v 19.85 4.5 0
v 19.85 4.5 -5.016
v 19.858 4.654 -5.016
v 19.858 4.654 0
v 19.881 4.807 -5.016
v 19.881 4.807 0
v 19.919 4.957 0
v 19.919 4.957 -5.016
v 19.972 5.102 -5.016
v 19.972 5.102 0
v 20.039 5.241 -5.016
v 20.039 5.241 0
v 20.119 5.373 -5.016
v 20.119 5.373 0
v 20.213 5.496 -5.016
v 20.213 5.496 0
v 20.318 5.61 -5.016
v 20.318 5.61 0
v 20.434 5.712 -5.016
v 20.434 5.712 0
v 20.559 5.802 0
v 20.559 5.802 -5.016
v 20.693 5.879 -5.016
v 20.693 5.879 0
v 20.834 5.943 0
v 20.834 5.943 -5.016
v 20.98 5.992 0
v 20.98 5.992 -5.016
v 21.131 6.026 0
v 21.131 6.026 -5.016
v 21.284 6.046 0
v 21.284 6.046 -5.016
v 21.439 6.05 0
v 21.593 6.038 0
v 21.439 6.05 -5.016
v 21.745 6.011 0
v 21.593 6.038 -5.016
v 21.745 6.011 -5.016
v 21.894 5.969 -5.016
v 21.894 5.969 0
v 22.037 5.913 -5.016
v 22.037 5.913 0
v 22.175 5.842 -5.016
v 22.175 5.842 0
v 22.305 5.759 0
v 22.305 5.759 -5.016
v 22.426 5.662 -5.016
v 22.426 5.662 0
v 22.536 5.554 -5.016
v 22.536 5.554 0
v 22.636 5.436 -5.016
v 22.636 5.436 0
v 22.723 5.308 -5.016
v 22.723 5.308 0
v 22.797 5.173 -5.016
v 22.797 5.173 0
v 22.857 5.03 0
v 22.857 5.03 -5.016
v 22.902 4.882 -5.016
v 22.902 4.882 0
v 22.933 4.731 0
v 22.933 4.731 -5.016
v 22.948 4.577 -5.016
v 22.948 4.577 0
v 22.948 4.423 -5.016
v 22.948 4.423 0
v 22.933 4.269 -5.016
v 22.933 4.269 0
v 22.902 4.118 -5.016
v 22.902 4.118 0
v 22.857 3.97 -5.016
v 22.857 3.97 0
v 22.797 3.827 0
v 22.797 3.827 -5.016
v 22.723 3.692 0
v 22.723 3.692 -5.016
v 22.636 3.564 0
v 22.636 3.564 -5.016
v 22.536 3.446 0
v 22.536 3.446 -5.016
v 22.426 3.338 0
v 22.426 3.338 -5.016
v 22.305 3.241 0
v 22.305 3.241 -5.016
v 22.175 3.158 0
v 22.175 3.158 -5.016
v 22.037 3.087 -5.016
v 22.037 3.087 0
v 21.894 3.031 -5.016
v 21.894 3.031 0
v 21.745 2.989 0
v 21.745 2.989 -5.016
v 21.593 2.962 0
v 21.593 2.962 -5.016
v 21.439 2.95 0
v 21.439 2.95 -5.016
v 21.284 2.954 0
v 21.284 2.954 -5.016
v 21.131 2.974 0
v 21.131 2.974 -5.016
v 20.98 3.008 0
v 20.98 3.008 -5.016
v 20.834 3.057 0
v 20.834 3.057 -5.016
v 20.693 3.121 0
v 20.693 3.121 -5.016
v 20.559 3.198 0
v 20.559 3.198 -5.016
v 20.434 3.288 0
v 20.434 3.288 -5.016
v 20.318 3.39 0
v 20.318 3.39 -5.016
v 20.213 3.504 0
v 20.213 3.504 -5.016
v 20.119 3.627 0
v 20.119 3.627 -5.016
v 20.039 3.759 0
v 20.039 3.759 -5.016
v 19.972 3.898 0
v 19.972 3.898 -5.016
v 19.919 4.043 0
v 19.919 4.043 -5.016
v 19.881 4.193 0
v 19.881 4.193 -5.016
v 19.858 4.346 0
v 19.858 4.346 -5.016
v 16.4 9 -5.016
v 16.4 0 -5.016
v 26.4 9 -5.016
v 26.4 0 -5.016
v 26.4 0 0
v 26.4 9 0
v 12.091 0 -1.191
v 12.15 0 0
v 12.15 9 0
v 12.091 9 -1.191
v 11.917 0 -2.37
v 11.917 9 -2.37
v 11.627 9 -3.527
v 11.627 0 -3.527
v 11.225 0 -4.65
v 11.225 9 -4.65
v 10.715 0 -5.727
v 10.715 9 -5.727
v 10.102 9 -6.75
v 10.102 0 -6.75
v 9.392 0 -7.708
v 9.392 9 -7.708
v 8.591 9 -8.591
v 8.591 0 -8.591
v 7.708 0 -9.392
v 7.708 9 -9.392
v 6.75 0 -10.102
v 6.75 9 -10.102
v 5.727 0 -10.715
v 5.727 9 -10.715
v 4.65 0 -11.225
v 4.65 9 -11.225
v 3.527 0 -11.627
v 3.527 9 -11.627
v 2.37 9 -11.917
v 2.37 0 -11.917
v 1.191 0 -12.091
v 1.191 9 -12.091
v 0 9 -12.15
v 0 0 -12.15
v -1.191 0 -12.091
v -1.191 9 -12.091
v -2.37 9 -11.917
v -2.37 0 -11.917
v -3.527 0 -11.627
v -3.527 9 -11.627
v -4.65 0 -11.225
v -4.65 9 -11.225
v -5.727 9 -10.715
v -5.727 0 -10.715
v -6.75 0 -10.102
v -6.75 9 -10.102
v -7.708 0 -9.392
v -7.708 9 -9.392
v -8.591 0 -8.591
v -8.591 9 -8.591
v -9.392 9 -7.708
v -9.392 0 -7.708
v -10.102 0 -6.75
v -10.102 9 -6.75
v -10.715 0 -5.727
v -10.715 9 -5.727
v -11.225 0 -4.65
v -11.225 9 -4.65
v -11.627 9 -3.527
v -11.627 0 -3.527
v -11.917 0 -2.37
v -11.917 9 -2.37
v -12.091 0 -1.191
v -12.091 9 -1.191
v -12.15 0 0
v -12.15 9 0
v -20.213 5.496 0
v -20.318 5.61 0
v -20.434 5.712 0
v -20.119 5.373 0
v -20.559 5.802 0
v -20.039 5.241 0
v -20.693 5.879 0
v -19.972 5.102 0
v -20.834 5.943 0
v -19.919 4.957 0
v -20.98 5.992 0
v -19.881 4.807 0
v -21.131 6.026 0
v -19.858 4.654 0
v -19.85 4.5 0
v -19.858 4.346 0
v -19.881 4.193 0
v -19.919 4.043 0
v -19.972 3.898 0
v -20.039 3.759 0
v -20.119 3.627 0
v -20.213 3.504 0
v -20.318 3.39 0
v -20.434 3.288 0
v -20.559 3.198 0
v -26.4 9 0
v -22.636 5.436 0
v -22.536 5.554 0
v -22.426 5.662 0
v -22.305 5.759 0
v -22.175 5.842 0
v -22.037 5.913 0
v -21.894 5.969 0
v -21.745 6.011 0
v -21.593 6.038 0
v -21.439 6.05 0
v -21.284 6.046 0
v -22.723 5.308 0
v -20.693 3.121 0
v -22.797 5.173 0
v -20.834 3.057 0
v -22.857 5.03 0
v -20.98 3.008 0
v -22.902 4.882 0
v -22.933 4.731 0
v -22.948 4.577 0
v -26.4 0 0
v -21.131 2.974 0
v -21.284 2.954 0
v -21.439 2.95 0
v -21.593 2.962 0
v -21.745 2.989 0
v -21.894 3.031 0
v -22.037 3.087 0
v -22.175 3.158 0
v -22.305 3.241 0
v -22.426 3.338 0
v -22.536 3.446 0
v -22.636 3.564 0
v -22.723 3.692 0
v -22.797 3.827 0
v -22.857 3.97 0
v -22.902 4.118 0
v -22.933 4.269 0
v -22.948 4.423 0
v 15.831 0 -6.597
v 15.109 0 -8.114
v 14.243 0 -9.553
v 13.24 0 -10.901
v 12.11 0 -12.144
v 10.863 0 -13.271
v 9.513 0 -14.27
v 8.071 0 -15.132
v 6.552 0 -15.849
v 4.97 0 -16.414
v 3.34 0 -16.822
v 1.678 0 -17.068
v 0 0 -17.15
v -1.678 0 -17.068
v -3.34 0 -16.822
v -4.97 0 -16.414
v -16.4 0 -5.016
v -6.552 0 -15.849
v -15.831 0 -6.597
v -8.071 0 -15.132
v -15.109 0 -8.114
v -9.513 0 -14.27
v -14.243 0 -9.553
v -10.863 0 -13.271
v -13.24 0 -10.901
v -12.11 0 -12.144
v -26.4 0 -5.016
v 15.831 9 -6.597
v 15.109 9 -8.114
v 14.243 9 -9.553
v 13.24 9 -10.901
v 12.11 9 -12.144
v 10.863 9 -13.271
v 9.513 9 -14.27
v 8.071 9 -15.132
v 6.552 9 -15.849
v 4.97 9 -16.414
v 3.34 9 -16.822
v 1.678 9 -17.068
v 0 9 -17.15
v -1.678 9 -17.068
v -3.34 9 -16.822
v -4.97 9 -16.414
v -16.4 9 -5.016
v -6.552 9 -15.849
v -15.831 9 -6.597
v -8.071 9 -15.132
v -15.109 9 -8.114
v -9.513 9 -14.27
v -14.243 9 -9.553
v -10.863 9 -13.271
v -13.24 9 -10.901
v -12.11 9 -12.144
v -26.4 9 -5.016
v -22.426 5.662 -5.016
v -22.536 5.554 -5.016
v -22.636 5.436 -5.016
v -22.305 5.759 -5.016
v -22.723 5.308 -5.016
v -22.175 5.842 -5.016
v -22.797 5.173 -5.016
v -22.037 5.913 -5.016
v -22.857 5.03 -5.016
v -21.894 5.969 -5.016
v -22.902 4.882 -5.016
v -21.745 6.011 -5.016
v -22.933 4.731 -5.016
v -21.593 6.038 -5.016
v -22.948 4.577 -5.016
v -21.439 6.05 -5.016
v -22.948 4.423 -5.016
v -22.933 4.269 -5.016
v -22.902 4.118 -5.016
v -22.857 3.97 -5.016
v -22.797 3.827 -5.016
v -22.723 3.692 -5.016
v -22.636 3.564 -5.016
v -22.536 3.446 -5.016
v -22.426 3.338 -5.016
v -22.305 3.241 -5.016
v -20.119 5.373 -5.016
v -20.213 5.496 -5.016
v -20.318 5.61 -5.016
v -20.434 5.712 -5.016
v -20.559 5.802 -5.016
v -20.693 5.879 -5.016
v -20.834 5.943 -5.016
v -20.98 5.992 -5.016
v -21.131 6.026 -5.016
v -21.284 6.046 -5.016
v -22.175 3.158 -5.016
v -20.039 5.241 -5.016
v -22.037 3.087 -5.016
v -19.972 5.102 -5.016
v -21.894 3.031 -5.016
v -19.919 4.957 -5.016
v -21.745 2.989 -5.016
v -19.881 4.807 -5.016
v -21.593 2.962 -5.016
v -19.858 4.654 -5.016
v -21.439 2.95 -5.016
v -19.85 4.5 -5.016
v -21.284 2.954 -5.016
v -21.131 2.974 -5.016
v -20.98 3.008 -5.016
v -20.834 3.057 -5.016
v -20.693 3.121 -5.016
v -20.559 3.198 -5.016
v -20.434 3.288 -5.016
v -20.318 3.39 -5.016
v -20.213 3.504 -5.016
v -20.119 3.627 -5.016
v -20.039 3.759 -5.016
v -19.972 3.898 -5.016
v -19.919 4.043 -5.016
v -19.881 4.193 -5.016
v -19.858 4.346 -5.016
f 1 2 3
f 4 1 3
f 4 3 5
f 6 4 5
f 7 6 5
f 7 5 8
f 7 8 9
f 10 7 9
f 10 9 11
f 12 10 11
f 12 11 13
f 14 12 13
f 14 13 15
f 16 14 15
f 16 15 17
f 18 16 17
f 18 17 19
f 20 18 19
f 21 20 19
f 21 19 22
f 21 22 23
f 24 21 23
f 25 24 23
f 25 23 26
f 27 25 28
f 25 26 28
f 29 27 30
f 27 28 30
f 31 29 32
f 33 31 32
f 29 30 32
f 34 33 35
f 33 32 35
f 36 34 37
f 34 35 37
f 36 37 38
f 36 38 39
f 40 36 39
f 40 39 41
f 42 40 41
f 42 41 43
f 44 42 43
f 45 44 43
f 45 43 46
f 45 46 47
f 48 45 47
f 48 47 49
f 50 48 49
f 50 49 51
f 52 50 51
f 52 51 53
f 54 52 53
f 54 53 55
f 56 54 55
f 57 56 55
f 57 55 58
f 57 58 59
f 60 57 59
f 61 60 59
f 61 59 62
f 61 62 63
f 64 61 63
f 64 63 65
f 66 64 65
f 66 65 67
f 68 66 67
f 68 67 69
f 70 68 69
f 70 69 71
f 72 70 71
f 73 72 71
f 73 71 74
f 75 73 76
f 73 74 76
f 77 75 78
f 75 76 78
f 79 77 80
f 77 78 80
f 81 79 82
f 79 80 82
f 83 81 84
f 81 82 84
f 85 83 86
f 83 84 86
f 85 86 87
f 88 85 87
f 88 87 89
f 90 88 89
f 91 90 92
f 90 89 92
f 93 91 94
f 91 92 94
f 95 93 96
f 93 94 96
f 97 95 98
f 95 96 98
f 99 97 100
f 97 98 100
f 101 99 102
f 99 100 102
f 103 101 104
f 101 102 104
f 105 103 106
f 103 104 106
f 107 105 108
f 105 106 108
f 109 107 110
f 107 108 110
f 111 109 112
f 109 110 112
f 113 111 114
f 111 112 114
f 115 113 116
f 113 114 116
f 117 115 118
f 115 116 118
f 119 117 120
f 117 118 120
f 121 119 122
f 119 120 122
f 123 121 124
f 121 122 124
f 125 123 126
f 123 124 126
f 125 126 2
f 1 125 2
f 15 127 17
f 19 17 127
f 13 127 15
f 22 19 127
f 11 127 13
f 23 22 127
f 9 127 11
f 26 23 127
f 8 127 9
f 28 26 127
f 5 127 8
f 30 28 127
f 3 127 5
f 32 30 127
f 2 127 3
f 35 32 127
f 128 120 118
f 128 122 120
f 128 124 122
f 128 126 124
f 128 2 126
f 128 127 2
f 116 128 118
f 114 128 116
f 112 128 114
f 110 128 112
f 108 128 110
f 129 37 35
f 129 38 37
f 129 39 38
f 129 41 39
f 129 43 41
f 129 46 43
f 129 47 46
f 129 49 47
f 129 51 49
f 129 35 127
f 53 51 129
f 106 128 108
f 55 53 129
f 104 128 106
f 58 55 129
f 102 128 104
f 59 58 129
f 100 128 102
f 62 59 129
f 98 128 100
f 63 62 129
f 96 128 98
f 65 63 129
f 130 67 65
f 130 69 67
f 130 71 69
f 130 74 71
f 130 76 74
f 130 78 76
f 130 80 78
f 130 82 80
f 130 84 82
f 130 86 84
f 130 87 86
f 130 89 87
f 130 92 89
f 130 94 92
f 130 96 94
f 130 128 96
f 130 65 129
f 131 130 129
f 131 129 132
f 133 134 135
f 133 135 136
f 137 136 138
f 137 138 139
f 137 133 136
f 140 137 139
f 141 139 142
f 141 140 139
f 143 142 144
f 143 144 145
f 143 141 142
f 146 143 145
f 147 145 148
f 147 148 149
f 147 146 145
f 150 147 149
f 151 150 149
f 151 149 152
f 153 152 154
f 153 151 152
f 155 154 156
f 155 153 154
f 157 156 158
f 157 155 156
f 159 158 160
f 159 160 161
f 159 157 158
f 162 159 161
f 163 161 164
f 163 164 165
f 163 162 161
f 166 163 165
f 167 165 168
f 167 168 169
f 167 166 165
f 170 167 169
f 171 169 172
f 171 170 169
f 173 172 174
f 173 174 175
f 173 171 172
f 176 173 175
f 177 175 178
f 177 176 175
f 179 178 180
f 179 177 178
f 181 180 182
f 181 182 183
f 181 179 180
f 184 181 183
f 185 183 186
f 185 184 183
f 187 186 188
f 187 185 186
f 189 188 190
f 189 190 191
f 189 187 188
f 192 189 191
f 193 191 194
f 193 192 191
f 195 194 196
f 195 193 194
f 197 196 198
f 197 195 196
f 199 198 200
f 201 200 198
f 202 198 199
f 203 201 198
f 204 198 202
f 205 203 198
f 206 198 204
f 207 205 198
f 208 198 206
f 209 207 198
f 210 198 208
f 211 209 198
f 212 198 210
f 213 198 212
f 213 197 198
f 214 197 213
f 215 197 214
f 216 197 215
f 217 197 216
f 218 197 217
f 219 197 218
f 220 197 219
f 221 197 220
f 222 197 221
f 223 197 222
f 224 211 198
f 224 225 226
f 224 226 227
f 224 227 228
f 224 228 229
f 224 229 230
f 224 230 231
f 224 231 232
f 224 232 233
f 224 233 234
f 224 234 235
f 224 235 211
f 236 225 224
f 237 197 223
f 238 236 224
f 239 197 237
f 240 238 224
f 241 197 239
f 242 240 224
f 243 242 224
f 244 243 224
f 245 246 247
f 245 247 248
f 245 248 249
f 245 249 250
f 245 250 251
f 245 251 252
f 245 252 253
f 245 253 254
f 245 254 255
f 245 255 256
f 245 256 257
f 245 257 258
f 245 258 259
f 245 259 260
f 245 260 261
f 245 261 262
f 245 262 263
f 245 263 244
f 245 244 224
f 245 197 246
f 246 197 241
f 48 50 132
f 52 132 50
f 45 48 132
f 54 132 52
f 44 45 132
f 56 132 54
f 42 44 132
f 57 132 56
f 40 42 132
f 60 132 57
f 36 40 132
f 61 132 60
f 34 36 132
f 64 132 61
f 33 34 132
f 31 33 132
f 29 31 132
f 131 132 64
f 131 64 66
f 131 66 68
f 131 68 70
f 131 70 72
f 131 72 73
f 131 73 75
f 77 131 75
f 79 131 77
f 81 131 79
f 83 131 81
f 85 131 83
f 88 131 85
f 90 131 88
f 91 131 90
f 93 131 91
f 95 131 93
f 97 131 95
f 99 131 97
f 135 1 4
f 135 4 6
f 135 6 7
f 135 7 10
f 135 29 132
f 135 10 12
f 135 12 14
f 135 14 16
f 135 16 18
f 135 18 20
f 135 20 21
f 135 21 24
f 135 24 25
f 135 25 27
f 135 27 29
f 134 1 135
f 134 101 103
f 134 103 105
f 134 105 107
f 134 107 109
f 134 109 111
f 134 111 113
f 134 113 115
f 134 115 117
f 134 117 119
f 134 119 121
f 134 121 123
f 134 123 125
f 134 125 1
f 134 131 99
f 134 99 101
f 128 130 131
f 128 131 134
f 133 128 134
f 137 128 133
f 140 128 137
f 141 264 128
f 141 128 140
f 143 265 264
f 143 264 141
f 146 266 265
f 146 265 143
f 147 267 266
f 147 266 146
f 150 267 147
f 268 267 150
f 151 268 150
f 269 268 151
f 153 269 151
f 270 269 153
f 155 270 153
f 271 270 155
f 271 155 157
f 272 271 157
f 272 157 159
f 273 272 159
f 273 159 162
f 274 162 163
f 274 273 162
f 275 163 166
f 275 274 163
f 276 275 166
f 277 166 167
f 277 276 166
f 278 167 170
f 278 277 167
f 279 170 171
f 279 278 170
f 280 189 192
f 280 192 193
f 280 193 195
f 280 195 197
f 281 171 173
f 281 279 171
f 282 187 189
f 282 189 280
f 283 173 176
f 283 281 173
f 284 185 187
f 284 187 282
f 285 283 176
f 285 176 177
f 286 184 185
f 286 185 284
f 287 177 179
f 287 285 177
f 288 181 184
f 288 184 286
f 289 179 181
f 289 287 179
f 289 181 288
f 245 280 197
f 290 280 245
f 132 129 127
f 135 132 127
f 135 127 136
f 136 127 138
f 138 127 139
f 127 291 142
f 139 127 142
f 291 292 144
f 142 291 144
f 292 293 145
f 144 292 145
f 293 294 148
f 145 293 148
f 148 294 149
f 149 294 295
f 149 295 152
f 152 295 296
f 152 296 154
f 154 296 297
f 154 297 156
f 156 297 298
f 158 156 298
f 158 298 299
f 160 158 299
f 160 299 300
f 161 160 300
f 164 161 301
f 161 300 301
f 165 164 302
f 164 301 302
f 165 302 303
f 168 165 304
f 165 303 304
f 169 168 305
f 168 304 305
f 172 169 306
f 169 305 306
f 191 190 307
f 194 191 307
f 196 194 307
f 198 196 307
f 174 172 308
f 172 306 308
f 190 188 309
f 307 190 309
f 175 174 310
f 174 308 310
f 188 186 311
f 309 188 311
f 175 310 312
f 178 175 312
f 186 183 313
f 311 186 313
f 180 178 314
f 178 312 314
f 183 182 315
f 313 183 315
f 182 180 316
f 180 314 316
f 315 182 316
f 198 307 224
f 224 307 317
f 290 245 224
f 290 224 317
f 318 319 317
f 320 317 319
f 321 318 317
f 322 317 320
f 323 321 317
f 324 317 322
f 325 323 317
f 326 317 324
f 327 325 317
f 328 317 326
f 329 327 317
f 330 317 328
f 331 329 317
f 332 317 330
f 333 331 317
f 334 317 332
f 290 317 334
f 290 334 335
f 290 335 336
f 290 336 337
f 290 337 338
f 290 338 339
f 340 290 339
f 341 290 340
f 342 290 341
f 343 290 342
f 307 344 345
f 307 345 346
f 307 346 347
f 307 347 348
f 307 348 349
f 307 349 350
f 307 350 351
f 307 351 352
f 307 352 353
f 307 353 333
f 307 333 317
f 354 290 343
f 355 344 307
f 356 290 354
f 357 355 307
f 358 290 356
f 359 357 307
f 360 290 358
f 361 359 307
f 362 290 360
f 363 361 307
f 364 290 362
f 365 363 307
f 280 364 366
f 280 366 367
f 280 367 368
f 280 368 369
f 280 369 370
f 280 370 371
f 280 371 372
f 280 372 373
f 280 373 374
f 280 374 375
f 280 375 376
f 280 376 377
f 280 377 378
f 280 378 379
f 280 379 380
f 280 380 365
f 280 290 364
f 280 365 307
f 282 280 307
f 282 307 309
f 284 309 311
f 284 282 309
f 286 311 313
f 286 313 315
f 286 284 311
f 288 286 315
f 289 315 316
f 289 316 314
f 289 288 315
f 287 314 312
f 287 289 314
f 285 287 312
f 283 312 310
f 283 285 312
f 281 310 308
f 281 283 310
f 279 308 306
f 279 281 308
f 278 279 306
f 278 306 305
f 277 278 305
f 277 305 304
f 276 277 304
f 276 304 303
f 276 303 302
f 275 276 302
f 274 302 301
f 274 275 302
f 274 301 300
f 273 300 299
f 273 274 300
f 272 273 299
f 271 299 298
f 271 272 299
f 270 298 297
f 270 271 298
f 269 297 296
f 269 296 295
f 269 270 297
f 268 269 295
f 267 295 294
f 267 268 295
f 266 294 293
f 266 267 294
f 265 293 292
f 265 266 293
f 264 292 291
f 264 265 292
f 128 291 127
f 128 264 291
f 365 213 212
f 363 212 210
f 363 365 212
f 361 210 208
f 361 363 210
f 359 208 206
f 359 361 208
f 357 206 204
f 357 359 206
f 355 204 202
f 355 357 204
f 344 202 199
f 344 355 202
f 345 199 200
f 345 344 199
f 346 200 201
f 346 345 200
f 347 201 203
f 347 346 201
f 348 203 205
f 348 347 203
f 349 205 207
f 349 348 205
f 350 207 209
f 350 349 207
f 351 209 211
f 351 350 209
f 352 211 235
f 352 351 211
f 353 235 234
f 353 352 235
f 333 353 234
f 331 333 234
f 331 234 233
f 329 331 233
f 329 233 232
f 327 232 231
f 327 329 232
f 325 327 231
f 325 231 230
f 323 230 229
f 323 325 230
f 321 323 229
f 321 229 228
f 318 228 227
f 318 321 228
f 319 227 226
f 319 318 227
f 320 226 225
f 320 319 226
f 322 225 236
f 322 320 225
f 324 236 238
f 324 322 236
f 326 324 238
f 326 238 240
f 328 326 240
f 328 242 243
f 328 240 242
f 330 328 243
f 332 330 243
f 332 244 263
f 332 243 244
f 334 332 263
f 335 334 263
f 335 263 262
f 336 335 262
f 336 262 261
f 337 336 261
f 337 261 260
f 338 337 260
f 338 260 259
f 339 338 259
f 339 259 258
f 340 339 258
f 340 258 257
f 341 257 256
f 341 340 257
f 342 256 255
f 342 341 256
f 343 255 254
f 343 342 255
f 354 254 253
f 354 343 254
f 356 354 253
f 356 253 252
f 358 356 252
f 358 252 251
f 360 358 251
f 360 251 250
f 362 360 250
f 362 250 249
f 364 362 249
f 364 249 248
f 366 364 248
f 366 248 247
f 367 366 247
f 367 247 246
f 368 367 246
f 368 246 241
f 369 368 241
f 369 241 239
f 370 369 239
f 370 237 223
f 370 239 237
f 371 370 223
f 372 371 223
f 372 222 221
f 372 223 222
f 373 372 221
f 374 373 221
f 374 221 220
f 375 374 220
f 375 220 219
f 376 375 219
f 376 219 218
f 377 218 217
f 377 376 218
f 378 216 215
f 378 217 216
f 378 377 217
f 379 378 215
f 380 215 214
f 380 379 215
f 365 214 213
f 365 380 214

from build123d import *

# Parameters (mm, degrees)
BOSS_EXTRUDE1_DEPTH = 9
SKETCH2_R           = 1.55
CUT_EXTRUDE1_DEPTH  = 9


with BuildPart() as part:
    # Sketch1 → Boss-Extrude1 (new body)
    with BuildSketch(Plane(origin=(0, 0, 0), x_dir=(1, 0, 0), z_dir=(0, 1, 0))):
        with BuildLine():
            Line((16.4, 5.016223679), (26.4, 5.016223679))
            Line((26.4, 5.016223679), (26.4, 0))
            Line((26.4, 0), (12.15, 0))
            ThreePointArc((12.15, 0), (0, 12.15), (-12.15, 0))
            Line((-12.15, 0), (-26.4, 0))
            Line((-26.4, 0), (-26.4, 5.016223679))
            Line((-26.4, 5.016223679), (-16.4, 5.016223679))
            ThreePointArc((-16.4, 5.016223679), (0, 17.15), (16.4, 5.016223679))
        make_face()
    extrude(amount=BOSS_EXTRUDE1_DEPTH)

    # Sketch2 → Cut-Extrude1 (cut)
    with BuildSketch(Plane(origin=(0, 0, -5.016223679), x_dir=(-1, 0, 0), z_dir=(0, 0, -1))):
        with Locations((-21.4, 4.5)):
            Circle(SKETCH2_R)
    cut_extrude1 = extrude(amount=-CUT_EXTRUDE1_DEPTH, mode=Mode.SUBTRACT)

    # Mirror1: Cut-Extrude1 across plane
    add(cut_extrude1.mirror(Plane(origin=(0, 0, 0), x_dir=(0, 0, 1), z_dir=(1, 0, 0))), mode=Mode.SUBTRACT)


solid = part.part
